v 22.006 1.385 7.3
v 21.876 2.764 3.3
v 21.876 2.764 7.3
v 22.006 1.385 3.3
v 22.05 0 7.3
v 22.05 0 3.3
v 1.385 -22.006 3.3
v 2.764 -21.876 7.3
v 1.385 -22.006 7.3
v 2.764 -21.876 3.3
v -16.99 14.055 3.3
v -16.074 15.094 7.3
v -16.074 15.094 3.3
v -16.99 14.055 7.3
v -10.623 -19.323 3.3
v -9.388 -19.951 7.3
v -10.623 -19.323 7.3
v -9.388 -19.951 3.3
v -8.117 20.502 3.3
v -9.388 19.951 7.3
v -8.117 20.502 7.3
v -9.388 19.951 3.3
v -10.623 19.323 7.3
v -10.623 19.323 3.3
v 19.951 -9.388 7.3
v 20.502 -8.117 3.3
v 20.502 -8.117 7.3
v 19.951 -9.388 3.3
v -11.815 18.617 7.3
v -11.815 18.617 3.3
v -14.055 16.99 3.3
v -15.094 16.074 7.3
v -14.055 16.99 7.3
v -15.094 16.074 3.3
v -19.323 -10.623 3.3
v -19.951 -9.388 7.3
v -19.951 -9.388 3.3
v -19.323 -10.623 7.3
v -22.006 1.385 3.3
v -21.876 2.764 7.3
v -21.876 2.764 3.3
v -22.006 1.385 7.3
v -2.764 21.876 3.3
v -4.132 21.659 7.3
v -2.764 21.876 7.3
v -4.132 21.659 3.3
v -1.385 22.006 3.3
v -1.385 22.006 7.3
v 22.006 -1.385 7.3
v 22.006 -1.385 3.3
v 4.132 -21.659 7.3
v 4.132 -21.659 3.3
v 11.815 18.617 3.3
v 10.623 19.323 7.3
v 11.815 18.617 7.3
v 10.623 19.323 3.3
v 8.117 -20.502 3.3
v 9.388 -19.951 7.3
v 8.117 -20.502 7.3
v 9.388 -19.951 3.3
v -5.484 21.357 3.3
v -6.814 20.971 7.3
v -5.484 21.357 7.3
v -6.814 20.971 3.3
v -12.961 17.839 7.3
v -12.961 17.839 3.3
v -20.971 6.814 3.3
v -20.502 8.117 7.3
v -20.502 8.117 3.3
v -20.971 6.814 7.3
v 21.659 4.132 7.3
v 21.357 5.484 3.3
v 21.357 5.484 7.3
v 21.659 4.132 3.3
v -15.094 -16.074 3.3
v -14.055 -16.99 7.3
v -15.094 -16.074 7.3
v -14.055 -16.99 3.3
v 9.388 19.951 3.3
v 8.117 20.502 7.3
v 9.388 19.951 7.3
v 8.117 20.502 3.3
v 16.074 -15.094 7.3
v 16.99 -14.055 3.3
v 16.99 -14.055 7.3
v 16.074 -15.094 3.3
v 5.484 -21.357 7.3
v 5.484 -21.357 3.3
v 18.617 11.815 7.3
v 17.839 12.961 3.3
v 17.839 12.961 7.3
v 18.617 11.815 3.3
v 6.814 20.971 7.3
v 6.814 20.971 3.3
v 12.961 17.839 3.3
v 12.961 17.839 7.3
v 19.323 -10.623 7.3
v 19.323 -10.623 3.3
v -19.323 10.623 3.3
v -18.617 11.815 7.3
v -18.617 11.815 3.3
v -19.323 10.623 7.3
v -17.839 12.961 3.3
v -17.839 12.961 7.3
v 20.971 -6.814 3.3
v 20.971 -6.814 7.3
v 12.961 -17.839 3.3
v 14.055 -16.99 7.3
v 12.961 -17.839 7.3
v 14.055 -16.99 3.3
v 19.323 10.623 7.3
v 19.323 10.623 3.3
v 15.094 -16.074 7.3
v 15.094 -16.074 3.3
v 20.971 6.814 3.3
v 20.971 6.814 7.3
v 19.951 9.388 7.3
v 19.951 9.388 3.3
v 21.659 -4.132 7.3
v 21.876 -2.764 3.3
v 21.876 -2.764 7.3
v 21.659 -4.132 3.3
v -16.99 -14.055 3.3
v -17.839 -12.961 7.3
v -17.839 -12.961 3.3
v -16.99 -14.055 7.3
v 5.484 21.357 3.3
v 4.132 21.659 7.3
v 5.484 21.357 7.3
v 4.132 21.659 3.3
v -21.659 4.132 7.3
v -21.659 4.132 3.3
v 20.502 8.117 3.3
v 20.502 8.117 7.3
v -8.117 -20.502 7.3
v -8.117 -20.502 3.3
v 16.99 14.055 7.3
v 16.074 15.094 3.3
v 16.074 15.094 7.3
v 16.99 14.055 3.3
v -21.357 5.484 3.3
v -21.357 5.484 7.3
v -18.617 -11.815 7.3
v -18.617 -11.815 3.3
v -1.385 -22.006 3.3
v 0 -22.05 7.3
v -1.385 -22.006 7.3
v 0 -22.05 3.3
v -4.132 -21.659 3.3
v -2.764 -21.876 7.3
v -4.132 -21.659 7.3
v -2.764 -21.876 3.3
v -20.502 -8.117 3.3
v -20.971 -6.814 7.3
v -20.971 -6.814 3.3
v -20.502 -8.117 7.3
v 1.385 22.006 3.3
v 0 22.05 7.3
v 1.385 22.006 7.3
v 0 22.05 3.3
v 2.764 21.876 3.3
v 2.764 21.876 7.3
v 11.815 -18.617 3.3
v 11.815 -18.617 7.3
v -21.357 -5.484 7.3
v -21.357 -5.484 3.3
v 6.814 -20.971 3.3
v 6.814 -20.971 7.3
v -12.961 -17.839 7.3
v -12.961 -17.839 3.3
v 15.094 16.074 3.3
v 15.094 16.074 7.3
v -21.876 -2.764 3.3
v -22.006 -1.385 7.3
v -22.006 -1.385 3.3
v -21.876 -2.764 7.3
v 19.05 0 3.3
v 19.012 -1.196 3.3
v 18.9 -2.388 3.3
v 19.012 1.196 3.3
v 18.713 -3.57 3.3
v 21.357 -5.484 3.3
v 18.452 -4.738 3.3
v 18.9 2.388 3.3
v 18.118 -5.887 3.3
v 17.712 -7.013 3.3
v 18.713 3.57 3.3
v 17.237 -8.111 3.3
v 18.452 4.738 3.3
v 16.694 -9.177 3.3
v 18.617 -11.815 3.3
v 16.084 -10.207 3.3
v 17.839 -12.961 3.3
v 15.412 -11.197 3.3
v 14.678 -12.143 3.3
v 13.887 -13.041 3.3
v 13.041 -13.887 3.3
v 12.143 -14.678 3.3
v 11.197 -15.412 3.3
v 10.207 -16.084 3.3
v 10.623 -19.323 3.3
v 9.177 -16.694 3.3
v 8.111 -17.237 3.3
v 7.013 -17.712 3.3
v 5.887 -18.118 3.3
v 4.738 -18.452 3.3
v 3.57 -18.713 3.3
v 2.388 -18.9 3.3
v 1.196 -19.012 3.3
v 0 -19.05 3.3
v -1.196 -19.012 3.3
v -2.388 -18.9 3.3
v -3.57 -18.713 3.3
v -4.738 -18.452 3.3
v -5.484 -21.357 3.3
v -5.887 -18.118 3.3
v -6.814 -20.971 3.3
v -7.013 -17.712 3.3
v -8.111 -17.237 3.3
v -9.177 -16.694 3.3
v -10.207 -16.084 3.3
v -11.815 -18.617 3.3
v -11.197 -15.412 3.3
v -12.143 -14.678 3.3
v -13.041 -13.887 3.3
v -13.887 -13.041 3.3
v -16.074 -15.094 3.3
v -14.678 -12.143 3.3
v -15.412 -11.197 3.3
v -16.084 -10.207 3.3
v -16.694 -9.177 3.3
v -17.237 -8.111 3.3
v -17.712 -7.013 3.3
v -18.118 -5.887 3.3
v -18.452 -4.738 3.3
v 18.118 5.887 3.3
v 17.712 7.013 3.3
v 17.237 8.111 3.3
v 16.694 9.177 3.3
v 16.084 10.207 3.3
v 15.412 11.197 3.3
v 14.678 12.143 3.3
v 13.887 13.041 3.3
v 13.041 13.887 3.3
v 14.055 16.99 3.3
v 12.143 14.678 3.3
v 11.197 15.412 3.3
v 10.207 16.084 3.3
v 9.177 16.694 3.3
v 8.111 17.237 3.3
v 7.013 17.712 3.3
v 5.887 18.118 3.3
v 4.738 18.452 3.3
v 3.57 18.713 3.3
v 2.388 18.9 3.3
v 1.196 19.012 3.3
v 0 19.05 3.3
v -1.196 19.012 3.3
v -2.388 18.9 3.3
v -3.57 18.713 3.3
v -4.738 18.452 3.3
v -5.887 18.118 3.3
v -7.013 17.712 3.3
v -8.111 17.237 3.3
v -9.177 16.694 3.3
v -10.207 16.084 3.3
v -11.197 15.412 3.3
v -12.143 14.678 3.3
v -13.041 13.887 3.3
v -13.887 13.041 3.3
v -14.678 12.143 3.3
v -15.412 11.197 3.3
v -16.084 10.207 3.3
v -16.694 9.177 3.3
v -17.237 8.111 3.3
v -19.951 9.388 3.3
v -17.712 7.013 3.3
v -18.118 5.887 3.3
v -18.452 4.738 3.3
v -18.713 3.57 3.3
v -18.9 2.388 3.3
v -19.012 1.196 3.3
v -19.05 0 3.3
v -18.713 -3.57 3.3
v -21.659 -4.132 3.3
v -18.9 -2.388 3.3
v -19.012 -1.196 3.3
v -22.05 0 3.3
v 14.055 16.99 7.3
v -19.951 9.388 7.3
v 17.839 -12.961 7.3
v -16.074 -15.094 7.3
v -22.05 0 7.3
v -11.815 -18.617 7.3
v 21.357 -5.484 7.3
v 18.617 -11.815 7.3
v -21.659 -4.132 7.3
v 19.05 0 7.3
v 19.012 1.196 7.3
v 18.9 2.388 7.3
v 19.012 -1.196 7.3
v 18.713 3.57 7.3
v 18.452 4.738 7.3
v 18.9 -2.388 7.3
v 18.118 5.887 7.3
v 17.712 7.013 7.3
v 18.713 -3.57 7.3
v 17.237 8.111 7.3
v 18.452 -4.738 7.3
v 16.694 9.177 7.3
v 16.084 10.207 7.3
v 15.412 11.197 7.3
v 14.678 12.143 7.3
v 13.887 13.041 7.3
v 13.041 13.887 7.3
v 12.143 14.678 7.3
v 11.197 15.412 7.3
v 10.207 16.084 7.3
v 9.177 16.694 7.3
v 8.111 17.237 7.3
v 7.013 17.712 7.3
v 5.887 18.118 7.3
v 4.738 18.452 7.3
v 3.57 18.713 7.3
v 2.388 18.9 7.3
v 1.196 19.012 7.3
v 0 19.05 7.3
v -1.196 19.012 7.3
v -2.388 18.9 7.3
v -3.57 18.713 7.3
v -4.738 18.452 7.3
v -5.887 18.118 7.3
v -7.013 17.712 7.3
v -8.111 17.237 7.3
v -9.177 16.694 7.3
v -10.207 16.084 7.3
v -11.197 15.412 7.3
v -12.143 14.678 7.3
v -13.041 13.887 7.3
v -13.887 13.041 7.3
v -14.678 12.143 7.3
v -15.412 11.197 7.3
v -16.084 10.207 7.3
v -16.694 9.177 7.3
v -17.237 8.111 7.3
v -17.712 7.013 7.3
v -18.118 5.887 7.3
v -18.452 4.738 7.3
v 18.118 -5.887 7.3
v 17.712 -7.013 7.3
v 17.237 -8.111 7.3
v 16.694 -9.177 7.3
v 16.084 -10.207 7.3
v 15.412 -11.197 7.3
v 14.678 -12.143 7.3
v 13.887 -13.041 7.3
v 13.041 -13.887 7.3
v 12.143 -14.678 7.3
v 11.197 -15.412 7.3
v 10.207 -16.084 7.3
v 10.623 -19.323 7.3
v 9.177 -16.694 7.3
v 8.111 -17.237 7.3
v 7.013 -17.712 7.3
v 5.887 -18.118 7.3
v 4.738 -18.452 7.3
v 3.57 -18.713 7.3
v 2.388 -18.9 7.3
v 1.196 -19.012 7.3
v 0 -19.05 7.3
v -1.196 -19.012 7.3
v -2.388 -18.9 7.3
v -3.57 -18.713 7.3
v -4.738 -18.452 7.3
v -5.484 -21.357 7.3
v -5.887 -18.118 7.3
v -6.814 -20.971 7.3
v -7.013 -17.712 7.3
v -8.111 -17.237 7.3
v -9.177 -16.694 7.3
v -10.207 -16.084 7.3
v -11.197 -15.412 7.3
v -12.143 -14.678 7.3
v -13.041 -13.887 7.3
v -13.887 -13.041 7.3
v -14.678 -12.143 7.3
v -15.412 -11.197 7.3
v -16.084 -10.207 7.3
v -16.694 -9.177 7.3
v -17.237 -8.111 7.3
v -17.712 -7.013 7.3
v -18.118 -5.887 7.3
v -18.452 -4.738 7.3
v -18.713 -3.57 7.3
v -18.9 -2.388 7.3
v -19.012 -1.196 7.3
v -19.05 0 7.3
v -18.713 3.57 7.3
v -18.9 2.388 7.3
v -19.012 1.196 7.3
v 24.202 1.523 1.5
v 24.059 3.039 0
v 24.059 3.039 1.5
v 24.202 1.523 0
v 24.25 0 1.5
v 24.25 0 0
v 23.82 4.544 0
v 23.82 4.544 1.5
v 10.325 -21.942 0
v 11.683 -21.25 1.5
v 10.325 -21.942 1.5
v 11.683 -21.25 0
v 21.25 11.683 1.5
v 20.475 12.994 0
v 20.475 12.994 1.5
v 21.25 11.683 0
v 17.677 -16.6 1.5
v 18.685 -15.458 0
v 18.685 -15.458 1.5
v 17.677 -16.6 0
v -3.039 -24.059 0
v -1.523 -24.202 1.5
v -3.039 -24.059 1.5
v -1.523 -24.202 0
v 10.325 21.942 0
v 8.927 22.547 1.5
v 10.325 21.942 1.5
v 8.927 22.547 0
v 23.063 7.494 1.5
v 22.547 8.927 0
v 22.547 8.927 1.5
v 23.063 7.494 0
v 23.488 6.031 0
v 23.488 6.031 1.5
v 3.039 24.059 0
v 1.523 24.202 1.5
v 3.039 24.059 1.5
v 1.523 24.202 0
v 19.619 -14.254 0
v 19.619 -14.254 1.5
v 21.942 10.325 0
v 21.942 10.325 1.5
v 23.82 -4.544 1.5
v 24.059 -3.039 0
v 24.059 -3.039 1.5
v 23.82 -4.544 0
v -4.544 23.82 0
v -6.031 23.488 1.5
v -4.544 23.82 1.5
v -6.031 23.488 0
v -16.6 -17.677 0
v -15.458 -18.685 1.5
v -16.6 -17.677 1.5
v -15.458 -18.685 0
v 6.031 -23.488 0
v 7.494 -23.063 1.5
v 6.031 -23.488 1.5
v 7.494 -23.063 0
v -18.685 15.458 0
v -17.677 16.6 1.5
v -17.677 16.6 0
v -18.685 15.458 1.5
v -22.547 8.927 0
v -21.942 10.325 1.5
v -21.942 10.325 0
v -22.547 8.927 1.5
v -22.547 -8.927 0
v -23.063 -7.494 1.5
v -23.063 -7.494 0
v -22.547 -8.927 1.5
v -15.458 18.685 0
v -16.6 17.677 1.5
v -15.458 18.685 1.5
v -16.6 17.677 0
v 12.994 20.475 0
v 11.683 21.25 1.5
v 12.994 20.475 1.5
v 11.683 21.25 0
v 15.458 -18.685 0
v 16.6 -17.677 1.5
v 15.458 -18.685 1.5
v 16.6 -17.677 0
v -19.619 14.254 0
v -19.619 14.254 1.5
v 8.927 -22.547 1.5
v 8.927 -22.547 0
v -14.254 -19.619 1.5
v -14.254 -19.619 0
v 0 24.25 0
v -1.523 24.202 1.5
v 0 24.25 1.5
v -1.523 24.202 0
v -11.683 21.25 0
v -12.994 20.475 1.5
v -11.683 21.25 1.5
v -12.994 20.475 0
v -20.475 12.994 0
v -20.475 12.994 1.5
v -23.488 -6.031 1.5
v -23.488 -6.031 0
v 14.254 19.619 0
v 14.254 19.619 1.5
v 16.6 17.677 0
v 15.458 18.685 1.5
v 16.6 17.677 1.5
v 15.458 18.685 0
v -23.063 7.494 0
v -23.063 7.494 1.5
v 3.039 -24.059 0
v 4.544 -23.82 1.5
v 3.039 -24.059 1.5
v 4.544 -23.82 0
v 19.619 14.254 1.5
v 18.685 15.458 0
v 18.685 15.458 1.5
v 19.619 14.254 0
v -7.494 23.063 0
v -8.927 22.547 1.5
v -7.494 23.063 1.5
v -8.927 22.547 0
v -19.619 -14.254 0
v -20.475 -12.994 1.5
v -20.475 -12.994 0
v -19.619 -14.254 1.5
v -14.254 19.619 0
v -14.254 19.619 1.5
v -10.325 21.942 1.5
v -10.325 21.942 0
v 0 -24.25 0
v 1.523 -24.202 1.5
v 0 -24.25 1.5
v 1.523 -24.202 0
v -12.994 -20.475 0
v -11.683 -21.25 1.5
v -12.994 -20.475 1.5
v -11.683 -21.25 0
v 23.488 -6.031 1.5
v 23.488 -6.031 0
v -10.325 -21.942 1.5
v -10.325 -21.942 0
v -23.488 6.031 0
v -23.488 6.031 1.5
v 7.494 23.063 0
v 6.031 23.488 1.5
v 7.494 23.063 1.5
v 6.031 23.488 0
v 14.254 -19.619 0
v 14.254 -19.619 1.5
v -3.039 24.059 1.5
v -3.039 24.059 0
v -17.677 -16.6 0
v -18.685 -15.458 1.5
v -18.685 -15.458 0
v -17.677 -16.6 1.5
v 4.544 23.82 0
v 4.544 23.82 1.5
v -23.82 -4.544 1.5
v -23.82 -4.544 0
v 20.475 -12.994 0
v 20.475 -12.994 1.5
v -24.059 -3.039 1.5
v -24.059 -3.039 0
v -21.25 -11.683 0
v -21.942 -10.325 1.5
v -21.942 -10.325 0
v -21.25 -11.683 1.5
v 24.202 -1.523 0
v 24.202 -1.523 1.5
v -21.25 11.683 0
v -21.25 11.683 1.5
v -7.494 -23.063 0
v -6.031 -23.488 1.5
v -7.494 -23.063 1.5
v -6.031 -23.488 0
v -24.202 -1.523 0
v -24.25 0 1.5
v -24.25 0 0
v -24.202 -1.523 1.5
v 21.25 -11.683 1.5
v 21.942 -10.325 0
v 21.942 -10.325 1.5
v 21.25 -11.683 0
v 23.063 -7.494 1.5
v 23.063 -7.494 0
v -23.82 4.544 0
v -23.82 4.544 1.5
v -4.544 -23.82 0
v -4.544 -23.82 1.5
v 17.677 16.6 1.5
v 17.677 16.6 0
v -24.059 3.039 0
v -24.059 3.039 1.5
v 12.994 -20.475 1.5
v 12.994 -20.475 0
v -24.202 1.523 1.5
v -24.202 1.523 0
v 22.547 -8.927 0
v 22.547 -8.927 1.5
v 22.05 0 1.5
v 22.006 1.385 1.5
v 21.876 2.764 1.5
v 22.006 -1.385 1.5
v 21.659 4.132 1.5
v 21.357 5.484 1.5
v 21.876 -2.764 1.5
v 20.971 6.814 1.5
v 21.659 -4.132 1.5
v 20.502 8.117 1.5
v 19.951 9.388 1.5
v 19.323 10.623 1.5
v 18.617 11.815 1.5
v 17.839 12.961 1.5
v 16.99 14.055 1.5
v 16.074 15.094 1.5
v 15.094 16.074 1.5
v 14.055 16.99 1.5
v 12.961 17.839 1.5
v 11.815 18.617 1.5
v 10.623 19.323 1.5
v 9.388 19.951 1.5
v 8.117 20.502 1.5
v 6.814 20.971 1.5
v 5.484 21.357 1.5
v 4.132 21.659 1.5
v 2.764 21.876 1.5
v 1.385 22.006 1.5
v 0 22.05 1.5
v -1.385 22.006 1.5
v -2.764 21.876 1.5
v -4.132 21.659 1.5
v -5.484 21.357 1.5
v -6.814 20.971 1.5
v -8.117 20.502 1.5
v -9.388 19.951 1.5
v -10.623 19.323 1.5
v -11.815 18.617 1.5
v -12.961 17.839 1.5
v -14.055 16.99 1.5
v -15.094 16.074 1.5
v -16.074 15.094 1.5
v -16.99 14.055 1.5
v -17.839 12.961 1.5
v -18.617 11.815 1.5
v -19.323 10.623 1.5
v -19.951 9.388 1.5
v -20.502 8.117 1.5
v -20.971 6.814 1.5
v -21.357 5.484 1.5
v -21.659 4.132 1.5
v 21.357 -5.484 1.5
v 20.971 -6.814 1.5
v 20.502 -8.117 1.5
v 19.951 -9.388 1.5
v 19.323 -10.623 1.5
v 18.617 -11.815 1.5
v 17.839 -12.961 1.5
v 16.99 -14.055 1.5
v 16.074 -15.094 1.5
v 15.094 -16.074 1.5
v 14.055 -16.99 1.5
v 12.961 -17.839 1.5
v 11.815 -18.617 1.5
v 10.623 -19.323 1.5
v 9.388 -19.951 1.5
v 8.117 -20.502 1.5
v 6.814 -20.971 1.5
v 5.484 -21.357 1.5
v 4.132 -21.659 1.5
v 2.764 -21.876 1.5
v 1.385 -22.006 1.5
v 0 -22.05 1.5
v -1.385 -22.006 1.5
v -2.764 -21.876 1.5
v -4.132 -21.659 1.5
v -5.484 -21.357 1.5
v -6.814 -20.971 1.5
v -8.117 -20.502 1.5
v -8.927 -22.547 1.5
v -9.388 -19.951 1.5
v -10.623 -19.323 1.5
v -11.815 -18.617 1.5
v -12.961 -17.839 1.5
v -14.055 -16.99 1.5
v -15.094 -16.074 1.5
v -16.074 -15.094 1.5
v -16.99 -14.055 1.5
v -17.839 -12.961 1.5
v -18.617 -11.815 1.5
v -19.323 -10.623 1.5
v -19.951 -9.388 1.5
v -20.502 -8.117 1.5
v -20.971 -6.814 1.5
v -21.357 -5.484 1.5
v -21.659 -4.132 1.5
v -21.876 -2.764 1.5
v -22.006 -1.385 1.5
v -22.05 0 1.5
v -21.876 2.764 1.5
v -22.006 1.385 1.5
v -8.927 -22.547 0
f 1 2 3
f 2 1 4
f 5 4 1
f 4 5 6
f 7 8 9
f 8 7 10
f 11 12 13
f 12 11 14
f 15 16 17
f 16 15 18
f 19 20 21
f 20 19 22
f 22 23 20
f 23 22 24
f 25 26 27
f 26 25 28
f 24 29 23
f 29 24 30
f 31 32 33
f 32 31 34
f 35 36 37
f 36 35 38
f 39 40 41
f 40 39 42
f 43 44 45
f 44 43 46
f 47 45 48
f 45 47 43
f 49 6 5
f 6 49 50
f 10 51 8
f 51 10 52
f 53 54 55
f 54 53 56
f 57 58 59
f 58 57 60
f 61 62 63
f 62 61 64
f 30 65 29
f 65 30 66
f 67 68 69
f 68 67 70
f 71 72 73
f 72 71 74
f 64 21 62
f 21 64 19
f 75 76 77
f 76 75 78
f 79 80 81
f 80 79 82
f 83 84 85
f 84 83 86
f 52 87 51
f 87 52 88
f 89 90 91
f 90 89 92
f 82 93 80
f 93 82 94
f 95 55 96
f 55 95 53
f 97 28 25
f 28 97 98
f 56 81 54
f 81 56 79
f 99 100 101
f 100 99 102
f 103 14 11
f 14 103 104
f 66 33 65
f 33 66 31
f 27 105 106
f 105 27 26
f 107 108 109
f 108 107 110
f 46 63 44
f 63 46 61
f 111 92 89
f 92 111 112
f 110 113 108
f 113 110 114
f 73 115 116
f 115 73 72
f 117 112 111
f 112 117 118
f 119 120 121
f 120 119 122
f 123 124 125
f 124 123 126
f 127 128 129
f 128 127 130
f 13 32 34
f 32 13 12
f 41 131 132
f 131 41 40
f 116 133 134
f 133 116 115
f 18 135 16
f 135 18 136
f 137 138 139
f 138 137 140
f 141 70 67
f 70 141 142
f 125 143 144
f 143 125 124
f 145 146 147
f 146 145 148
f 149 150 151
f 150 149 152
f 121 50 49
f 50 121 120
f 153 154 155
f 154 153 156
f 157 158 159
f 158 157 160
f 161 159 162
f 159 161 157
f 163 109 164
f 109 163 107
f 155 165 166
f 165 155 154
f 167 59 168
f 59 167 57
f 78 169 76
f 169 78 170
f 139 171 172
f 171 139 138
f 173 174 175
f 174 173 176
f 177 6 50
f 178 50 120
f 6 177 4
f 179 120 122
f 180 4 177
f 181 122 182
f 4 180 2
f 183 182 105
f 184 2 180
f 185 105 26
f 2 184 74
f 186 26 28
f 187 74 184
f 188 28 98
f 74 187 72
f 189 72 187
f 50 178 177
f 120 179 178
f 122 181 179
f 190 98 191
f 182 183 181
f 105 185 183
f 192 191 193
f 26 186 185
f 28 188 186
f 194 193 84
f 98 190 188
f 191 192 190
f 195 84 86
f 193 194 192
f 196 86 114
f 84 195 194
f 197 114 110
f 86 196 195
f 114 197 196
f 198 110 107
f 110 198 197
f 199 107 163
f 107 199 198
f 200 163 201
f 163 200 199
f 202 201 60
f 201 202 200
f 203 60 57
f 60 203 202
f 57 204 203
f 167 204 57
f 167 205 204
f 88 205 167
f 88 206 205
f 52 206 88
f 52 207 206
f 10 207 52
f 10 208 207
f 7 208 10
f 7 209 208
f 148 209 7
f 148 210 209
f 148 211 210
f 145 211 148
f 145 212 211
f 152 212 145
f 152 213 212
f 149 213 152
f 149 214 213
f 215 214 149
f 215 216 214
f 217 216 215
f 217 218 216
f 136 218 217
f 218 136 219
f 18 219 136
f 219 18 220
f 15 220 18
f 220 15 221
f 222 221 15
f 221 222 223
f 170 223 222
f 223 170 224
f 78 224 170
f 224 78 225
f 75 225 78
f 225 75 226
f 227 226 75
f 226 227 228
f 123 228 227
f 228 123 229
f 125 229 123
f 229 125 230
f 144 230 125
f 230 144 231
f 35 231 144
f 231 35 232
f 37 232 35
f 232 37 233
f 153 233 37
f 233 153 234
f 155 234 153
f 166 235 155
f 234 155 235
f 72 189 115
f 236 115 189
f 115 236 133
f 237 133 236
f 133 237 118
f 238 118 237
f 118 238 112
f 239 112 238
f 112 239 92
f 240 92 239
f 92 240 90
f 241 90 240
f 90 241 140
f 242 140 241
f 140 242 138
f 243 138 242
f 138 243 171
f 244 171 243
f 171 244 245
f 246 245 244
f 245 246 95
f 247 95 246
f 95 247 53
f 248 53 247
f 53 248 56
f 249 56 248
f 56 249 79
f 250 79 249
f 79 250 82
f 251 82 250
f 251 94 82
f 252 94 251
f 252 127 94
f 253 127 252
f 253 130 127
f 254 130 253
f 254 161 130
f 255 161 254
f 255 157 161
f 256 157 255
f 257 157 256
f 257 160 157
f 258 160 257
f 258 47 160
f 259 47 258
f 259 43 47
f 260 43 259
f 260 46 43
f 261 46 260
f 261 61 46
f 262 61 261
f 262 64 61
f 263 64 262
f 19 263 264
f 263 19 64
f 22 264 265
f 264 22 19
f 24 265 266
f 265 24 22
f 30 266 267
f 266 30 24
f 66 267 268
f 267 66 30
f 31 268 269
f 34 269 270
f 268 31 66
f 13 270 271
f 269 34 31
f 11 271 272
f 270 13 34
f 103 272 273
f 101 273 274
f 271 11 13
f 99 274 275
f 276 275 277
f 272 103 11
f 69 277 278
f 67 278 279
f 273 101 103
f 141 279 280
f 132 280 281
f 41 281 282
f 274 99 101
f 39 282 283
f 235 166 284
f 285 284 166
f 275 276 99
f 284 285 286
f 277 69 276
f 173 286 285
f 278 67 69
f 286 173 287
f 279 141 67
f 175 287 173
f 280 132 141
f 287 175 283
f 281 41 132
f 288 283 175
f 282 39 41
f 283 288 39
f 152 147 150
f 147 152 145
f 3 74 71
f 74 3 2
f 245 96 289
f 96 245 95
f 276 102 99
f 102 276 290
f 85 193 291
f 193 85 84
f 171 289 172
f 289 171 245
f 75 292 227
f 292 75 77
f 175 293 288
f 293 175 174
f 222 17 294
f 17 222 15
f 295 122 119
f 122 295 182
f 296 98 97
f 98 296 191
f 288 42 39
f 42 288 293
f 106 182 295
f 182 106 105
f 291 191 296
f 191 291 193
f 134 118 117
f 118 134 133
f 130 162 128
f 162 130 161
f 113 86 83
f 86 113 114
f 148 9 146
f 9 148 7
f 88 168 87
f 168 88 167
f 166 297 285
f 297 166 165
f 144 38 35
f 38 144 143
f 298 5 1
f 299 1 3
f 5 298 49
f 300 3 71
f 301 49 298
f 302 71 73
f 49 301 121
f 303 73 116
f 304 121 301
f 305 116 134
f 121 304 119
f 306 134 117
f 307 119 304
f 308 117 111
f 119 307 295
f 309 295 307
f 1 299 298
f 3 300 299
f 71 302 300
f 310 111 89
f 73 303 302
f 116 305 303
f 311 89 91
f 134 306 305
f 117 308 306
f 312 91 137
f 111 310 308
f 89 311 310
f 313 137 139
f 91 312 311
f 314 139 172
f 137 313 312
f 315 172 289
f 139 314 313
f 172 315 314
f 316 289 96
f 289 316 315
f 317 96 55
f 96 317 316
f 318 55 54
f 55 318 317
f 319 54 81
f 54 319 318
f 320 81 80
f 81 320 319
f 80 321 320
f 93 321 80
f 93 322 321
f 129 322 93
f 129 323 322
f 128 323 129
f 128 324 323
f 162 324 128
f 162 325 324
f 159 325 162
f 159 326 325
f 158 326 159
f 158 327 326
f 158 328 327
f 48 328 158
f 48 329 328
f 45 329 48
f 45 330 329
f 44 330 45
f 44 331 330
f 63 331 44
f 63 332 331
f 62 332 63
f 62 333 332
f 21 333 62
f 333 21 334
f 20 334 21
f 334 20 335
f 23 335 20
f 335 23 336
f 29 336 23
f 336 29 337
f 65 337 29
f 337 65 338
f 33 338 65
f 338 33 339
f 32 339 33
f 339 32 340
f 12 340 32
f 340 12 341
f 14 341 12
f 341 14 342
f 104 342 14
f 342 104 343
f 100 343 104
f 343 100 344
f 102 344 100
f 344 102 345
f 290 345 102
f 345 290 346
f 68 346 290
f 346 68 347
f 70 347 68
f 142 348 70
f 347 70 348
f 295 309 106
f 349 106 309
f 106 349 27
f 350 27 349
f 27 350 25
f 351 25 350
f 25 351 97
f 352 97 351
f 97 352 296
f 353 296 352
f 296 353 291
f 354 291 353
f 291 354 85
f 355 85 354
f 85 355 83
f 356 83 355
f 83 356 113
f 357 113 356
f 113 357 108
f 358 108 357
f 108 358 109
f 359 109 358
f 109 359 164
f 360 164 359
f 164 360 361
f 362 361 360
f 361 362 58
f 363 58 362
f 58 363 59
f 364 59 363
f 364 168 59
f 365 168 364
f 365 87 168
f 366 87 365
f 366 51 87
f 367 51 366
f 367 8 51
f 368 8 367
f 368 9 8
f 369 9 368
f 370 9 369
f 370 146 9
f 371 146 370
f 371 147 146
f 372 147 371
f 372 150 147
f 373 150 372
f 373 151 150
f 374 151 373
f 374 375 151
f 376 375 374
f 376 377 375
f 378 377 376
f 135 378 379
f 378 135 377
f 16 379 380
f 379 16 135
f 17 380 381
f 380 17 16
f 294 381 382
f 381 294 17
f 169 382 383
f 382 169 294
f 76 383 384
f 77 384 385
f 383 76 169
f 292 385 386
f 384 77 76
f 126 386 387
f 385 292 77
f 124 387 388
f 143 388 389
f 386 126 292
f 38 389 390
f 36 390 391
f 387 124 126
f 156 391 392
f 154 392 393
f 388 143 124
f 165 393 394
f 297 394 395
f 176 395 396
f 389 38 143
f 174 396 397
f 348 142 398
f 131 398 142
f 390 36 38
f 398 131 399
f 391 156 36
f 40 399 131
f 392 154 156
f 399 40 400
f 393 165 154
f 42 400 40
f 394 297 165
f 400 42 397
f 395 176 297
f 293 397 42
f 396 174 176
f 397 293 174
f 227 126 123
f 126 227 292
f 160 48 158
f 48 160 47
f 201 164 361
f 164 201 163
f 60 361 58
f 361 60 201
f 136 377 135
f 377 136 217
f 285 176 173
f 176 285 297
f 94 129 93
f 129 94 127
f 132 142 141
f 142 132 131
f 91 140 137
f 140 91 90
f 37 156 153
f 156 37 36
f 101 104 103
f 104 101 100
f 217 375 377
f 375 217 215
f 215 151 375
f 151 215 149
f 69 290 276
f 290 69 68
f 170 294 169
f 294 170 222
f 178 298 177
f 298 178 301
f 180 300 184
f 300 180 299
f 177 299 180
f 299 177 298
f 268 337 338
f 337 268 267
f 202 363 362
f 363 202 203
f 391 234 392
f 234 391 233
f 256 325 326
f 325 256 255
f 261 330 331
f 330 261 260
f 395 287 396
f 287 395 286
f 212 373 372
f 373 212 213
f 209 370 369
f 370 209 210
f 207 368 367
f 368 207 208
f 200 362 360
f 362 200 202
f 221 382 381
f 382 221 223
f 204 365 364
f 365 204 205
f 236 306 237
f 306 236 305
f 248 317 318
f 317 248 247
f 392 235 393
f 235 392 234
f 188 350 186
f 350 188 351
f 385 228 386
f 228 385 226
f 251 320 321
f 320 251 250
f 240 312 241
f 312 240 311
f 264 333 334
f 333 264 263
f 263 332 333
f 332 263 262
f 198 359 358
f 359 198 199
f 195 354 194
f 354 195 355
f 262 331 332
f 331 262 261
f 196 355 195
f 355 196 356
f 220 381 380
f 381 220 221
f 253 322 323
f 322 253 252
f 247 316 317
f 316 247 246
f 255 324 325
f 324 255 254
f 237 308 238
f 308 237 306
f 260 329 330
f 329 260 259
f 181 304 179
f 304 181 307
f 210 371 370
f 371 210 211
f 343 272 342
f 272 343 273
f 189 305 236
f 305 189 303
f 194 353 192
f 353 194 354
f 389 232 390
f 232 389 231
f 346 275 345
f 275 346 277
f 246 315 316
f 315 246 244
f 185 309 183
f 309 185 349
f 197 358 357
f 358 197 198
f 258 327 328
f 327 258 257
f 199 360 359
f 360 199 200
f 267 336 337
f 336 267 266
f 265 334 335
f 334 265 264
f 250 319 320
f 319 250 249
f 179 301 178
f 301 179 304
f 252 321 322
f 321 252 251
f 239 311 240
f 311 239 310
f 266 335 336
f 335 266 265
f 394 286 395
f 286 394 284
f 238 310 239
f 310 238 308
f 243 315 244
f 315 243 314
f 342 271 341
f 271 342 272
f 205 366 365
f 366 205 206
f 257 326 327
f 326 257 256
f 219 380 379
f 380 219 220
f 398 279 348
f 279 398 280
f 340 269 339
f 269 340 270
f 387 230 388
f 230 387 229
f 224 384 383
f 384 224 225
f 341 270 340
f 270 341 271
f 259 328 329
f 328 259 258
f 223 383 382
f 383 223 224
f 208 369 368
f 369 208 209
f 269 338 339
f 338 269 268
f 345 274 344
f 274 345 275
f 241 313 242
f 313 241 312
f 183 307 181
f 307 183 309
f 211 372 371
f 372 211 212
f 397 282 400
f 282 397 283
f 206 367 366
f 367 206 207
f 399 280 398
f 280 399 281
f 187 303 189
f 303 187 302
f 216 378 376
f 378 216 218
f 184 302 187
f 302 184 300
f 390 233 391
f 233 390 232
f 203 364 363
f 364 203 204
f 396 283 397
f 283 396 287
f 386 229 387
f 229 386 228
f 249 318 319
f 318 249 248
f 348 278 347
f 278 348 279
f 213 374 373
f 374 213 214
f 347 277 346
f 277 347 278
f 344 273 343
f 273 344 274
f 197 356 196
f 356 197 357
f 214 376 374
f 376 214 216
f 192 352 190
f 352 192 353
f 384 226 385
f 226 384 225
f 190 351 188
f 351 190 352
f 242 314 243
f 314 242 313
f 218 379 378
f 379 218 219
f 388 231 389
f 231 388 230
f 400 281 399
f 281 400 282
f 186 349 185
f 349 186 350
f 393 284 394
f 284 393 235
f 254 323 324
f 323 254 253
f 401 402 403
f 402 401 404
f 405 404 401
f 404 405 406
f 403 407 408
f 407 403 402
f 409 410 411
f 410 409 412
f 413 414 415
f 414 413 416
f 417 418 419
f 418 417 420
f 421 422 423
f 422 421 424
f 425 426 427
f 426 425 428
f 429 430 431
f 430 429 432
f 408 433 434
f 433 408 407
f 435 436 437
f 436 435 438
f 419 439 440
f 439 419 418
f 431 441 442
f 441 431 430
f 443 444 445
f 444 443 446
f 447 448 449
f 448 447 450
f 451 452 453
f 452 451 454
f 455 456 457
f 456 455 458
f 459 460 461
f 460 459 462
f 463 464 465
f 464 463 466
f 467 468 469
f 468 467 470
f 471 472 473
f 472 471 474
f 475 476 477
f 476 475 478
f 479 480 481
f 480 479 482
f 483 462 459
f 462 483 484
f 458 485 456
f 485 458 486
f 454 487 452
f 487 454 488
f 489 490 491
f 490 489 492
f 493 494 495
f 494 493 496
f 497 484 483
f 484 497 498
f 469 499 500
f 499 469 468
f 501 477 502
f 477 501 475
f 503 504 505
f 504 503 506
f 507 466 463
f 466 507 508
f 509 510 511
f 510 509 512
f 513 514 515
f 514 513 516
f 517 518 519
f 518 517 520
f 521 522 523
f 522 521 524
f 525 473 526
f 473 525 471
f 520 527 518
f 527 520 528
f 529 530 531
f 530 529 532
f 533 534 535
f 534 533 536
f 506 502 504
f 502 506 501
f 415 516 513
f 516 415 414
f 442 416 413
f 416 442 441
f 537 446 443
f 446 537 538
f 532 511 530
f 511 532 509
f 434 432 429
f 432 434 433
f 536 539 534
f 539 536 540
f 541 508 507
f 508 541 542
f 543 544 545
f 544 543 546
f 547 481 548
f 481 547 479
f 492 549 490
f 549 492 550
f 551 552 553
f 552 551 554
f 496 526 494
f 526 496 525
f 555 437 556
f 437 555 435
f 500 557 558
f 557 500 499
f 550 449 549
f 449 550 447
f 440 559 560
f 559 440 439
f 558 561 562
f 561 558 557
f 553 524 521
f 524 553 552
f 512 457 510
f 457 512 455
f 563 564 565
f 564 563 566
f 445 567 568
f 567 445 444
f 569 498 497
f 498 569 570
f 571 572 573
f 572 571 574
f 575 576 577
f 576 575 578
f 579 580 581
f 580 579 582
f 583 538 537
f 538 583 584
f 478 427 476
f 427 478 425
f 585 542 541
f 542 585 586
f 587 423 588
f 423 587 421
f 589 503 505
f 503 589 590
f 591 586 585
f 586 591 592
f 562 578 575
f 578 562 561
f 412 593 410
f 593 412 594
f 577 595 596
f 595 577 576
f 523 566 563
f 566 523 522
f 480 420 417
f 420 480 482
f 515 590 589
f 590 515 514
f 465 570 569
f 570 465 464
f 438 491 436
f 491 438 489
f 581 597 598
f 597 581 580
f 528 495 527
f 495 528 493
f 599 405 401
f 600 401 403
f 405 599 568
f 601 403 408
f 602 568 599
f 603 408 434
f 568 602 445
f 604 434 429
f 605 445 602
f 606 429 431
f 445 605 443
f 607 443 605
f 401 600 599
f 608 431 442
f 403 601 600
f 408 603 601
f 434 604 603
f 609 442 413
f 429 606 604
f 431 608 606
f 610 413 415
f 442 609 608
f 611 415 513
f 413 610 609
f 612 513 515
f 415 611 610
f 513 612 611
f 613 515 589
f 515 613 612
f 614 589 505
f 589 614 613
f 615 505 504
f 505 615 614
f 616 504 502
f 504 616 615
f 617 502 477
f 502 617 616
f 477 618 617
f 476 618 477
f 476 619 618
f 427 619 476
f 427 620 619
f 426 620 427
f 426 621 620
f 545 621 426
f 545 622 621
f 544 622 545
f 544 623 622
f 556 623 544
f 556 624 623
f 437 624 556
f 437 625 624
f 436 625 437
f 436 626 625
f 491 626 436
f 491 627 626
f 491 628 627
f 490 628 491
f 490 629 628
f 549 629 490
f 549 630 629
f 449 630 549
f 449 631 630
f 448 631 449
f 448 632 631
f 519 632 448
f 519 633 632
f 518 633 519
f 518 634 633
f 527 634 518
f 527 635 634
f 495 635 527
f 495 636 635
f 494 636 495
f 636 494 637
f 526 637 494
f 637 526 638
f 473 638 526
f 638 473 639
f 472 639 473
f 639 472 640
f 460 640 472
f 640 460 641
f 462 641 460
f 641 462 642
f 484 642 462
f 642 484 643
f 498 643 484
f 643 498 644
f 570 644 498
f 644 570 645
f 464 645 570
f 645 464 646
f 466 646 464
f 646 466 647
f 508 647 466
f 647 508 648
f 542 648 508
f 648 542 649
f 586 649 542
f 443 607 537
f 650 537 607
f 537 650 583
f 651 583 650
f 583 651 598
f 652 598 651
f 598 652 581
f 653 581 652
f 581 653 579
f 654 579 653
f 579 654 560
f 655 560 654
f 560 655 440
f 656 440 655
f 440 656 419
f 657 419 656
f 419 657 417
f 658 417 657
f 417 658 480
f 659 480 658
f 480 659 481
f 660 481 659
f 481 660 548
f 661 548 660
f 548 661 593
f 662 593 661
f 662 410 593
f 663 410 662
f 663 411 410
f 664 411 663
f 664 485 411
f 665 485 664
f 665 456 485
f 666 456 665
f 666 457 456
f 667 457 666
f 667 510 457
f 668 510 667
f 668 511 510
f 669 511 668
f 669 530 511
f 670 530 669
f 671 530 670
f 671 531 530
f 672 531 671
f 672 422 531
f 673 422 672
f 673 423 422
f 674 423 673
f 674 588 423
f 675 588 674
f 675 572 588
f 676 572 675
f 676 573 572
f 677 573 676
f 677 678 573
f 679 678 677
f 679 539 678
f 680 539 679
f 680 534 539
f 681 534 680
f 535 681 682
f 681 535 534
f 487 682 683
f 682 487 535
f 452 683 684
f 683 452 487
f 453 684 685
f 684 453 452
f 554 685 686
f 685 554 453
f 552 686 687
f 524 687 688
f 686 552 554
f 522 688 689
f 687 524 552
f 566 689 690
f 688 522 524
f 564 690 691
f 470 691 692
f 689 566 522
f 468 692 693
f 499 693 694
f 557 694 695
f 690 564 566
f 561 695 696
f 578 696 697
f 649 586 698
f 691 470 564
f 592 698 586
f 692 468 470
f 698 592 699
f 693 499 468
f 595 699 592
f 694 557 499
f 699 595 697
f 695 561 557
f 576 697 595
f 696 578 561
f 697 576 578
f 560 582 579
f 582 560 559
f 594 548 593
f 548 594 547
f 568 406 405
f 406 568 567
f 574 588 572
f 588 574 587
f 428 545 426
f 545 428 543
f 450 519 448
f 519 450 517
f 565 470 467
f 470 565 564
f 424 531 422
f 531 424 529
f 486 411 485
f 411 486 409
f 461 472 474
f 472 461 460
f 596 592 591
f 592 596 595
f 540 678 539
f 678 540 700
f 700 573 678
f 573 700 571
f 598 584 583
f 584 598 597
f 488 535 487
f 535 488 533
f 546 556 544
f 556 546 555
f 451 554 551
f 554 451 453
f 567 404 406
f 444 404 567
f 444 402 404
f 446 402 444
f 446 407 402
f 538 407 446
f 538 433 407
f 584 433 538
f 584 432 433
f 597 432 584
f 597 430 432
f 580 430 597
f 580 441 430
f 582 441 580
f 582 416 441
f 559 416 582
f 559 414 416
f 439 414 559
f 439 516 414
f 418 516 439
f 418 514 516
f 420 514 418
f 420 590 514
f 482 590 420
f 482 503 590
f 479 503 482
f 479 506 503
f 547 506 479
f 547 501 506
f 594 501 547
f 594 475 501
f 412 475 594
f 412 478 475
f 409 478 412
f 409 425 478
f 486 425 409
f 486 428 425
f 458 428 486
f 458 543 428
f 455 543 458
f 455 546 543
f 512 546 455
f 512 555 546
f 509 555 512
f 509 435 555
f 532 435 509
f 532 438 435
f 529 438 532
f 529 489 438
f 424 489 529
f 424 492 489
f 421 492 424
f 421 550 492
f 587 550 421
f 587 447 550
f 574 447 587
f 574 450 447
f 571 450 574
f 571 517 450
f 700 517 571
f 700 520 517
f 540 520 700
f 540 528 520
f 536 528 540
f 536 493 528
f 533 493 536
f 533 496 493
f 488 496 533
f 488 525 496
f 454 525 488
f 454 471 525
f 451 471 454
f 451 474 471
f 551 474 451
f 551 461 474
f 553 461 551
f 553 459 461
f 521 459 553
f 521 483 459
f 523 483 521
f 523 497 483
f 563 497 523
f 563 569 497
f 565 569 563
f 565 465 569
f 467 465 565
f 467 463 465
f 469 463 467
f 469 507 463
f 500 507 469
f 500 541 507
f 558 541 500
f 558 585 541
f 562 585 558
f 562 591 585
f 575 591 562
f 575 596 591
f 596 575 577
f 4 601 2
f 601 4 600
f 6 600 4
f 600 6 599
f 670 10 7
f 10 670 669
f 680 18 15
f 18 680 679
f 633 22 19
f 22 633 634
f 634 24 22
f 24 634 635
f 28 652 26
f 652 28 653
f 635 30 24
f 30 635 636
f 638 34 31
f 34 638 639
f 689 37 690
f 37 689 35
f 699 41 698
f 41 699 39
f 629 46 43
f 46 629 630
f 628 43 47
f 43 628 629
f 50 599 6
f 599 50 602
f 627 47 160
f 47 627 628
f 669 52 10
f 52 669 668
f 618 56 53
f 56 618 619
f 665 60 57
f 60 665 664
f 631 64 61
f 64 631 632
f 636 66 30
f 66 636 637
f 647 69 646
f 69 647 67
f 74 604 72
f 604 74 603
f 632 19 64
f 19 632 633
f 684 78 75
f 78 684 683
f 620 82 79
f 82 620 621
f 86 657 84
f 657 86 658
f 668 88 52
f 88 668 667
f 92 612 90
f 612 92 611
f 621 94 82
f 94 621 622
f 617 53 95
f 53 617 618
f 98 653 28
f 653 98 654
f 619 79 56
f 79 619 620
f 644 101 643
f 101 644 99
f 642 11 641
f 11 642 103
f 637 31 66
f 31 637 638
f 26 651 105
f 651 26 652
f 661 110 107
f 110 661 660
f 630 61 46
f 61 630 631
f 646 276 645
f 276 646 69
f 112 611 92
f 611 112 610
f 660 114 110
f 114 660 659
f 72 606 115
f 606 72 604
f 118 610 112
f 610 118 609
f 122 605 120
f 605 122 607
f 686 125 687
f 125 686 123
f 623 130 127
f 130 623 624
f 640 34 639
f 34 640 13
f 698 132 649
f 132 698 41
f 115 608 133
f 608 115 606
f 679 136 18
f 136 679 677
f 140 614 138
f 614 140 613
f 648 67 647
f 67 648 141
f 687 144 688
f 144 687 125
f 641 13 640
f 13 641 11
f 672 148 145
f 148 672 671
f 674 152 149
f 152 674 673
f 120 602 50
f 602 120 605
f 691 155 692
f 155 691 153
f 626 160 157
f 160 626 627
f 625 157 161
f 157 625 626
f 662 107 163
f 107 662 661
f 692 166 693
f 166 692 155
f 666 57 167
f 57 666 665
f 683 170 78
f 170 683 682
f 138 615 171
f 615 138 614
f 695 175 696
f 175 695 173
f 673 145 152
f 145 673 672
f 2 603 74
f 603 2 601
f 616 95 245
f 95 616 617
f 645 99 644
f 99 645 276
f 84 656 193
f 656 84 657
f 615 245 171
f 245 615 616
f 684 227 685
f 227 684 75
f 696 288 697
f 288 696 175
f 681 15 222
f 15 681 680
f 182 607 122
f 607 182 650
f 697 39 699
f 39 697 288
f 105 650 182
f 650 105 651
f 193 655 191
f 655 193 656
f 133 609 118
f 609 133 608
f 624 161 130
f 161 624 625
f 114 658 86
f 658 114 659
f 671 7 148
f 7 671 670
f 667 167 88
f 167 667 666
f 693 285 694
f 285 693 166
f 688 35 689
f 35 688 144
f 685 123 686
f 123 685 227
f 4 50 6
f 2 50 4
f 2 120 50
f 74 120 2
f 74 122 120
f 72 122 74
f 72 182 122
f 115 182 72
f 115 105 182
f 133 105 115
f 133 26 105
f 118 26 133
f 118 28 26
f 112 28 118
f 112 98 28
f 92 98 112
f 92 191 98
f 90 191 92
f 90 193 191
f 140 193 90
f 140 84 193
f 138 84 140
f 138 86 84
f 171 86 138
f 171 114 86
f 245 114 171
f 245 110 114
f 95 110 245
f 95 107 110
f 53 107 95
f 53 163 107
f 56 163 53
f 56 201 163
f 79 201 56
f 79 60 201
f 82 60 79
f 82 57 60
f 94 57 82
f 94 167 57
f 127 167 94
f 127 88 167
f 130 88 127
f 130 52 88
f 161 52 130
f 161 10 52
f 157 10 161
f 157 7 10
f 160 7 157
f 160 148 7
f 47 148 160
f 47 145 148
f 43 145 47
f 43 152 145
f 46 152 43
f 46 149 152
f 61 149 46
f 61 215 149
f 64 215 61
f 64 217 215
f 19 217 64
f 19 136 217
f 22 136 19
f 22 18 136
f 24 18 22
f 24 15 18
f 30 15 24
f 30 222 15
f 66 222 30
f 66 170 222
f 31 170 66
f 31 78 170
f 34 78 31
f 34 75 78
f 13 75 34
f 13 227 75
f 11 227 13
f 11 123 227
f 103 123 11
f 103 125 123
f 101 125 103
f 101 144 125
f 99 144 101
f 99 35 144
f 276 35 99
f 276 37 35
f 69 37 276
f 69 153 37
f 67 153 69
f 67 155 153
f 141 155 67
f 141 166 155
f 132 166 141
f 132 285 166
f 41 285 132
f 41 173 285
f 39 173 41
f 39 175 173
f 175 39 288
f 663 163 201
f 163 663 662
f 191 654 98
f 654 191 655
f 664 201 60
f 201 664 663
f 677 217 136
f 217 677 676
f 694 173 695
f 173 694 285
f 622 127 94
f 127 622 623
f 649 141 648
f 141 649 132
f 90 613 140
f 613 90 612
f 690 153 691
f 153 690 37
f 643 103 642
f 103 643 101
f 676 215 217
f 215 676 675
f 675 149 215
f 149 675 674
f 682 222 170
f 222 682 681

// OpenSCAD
// Porcelain fuse mount cover for Finnish electric panel
// Based on original cover measurements

// Parameters (all in mm)
outer_diameter = 48.5;    // Outer diameter of the cover (extends over panel)
inner_diameter = 44.1;    // Diameter of the clip/lip that goes into the hole (reduced from 44.2)
cover_width = 1.5;        // Width of the main cover plate
clip_width = 1.8;         // Width of the clip/lip that sticks into hole

// Reinforcement ring parameters
ring_width = 3;           // Width of the reinforcement ring (radial)
ring_thickness = 4;       // Thickness of the ring (axial/height)

// Calculated values
outer_radius = outer_diameter / 2;
inner_radius = inner_diameter / 2;
ring_outer_radius = inner_radius;
ring_inner_radius = inner_radius - ring_width;

// Main module
module porcelain_cover() {
        union() {
            // Main cover plate (the part that sits on top of the panel)
            cylinder(h = cover_width, r = outer_radius, $fn=100);

            // Clip/lip (the part that goes into the hole)
            translate([0, 0, cover_width])
                cylinder(h = clip_width, r = inner_radius, $fn=100);

            // Reinforcement ring at the base of the clip (saves filament vs full disc)
            translate([0, 0, cover_width + clip_width])
                difference() {
                    cylinder(h = ring_thickness, r = ring_outer_radius, $fn=100);
                    // Hollow out the center to save filament
                    translate([0, 0, -0.1])
                        cylinder(h = ring_thickness + 0.2, r = ring_inner_radius, $fn=100);
                }
        }

        // You can add holes or other features here if needed
        // For example, a center hole for accessing fuses:
        // translate([0, 0, -0.1])
        //     cylinder(h = cover_width + clip_width + ring_thickness + 0.2, r = 5, $fn=50);
}

// Render the cover
porcelain_cover();
